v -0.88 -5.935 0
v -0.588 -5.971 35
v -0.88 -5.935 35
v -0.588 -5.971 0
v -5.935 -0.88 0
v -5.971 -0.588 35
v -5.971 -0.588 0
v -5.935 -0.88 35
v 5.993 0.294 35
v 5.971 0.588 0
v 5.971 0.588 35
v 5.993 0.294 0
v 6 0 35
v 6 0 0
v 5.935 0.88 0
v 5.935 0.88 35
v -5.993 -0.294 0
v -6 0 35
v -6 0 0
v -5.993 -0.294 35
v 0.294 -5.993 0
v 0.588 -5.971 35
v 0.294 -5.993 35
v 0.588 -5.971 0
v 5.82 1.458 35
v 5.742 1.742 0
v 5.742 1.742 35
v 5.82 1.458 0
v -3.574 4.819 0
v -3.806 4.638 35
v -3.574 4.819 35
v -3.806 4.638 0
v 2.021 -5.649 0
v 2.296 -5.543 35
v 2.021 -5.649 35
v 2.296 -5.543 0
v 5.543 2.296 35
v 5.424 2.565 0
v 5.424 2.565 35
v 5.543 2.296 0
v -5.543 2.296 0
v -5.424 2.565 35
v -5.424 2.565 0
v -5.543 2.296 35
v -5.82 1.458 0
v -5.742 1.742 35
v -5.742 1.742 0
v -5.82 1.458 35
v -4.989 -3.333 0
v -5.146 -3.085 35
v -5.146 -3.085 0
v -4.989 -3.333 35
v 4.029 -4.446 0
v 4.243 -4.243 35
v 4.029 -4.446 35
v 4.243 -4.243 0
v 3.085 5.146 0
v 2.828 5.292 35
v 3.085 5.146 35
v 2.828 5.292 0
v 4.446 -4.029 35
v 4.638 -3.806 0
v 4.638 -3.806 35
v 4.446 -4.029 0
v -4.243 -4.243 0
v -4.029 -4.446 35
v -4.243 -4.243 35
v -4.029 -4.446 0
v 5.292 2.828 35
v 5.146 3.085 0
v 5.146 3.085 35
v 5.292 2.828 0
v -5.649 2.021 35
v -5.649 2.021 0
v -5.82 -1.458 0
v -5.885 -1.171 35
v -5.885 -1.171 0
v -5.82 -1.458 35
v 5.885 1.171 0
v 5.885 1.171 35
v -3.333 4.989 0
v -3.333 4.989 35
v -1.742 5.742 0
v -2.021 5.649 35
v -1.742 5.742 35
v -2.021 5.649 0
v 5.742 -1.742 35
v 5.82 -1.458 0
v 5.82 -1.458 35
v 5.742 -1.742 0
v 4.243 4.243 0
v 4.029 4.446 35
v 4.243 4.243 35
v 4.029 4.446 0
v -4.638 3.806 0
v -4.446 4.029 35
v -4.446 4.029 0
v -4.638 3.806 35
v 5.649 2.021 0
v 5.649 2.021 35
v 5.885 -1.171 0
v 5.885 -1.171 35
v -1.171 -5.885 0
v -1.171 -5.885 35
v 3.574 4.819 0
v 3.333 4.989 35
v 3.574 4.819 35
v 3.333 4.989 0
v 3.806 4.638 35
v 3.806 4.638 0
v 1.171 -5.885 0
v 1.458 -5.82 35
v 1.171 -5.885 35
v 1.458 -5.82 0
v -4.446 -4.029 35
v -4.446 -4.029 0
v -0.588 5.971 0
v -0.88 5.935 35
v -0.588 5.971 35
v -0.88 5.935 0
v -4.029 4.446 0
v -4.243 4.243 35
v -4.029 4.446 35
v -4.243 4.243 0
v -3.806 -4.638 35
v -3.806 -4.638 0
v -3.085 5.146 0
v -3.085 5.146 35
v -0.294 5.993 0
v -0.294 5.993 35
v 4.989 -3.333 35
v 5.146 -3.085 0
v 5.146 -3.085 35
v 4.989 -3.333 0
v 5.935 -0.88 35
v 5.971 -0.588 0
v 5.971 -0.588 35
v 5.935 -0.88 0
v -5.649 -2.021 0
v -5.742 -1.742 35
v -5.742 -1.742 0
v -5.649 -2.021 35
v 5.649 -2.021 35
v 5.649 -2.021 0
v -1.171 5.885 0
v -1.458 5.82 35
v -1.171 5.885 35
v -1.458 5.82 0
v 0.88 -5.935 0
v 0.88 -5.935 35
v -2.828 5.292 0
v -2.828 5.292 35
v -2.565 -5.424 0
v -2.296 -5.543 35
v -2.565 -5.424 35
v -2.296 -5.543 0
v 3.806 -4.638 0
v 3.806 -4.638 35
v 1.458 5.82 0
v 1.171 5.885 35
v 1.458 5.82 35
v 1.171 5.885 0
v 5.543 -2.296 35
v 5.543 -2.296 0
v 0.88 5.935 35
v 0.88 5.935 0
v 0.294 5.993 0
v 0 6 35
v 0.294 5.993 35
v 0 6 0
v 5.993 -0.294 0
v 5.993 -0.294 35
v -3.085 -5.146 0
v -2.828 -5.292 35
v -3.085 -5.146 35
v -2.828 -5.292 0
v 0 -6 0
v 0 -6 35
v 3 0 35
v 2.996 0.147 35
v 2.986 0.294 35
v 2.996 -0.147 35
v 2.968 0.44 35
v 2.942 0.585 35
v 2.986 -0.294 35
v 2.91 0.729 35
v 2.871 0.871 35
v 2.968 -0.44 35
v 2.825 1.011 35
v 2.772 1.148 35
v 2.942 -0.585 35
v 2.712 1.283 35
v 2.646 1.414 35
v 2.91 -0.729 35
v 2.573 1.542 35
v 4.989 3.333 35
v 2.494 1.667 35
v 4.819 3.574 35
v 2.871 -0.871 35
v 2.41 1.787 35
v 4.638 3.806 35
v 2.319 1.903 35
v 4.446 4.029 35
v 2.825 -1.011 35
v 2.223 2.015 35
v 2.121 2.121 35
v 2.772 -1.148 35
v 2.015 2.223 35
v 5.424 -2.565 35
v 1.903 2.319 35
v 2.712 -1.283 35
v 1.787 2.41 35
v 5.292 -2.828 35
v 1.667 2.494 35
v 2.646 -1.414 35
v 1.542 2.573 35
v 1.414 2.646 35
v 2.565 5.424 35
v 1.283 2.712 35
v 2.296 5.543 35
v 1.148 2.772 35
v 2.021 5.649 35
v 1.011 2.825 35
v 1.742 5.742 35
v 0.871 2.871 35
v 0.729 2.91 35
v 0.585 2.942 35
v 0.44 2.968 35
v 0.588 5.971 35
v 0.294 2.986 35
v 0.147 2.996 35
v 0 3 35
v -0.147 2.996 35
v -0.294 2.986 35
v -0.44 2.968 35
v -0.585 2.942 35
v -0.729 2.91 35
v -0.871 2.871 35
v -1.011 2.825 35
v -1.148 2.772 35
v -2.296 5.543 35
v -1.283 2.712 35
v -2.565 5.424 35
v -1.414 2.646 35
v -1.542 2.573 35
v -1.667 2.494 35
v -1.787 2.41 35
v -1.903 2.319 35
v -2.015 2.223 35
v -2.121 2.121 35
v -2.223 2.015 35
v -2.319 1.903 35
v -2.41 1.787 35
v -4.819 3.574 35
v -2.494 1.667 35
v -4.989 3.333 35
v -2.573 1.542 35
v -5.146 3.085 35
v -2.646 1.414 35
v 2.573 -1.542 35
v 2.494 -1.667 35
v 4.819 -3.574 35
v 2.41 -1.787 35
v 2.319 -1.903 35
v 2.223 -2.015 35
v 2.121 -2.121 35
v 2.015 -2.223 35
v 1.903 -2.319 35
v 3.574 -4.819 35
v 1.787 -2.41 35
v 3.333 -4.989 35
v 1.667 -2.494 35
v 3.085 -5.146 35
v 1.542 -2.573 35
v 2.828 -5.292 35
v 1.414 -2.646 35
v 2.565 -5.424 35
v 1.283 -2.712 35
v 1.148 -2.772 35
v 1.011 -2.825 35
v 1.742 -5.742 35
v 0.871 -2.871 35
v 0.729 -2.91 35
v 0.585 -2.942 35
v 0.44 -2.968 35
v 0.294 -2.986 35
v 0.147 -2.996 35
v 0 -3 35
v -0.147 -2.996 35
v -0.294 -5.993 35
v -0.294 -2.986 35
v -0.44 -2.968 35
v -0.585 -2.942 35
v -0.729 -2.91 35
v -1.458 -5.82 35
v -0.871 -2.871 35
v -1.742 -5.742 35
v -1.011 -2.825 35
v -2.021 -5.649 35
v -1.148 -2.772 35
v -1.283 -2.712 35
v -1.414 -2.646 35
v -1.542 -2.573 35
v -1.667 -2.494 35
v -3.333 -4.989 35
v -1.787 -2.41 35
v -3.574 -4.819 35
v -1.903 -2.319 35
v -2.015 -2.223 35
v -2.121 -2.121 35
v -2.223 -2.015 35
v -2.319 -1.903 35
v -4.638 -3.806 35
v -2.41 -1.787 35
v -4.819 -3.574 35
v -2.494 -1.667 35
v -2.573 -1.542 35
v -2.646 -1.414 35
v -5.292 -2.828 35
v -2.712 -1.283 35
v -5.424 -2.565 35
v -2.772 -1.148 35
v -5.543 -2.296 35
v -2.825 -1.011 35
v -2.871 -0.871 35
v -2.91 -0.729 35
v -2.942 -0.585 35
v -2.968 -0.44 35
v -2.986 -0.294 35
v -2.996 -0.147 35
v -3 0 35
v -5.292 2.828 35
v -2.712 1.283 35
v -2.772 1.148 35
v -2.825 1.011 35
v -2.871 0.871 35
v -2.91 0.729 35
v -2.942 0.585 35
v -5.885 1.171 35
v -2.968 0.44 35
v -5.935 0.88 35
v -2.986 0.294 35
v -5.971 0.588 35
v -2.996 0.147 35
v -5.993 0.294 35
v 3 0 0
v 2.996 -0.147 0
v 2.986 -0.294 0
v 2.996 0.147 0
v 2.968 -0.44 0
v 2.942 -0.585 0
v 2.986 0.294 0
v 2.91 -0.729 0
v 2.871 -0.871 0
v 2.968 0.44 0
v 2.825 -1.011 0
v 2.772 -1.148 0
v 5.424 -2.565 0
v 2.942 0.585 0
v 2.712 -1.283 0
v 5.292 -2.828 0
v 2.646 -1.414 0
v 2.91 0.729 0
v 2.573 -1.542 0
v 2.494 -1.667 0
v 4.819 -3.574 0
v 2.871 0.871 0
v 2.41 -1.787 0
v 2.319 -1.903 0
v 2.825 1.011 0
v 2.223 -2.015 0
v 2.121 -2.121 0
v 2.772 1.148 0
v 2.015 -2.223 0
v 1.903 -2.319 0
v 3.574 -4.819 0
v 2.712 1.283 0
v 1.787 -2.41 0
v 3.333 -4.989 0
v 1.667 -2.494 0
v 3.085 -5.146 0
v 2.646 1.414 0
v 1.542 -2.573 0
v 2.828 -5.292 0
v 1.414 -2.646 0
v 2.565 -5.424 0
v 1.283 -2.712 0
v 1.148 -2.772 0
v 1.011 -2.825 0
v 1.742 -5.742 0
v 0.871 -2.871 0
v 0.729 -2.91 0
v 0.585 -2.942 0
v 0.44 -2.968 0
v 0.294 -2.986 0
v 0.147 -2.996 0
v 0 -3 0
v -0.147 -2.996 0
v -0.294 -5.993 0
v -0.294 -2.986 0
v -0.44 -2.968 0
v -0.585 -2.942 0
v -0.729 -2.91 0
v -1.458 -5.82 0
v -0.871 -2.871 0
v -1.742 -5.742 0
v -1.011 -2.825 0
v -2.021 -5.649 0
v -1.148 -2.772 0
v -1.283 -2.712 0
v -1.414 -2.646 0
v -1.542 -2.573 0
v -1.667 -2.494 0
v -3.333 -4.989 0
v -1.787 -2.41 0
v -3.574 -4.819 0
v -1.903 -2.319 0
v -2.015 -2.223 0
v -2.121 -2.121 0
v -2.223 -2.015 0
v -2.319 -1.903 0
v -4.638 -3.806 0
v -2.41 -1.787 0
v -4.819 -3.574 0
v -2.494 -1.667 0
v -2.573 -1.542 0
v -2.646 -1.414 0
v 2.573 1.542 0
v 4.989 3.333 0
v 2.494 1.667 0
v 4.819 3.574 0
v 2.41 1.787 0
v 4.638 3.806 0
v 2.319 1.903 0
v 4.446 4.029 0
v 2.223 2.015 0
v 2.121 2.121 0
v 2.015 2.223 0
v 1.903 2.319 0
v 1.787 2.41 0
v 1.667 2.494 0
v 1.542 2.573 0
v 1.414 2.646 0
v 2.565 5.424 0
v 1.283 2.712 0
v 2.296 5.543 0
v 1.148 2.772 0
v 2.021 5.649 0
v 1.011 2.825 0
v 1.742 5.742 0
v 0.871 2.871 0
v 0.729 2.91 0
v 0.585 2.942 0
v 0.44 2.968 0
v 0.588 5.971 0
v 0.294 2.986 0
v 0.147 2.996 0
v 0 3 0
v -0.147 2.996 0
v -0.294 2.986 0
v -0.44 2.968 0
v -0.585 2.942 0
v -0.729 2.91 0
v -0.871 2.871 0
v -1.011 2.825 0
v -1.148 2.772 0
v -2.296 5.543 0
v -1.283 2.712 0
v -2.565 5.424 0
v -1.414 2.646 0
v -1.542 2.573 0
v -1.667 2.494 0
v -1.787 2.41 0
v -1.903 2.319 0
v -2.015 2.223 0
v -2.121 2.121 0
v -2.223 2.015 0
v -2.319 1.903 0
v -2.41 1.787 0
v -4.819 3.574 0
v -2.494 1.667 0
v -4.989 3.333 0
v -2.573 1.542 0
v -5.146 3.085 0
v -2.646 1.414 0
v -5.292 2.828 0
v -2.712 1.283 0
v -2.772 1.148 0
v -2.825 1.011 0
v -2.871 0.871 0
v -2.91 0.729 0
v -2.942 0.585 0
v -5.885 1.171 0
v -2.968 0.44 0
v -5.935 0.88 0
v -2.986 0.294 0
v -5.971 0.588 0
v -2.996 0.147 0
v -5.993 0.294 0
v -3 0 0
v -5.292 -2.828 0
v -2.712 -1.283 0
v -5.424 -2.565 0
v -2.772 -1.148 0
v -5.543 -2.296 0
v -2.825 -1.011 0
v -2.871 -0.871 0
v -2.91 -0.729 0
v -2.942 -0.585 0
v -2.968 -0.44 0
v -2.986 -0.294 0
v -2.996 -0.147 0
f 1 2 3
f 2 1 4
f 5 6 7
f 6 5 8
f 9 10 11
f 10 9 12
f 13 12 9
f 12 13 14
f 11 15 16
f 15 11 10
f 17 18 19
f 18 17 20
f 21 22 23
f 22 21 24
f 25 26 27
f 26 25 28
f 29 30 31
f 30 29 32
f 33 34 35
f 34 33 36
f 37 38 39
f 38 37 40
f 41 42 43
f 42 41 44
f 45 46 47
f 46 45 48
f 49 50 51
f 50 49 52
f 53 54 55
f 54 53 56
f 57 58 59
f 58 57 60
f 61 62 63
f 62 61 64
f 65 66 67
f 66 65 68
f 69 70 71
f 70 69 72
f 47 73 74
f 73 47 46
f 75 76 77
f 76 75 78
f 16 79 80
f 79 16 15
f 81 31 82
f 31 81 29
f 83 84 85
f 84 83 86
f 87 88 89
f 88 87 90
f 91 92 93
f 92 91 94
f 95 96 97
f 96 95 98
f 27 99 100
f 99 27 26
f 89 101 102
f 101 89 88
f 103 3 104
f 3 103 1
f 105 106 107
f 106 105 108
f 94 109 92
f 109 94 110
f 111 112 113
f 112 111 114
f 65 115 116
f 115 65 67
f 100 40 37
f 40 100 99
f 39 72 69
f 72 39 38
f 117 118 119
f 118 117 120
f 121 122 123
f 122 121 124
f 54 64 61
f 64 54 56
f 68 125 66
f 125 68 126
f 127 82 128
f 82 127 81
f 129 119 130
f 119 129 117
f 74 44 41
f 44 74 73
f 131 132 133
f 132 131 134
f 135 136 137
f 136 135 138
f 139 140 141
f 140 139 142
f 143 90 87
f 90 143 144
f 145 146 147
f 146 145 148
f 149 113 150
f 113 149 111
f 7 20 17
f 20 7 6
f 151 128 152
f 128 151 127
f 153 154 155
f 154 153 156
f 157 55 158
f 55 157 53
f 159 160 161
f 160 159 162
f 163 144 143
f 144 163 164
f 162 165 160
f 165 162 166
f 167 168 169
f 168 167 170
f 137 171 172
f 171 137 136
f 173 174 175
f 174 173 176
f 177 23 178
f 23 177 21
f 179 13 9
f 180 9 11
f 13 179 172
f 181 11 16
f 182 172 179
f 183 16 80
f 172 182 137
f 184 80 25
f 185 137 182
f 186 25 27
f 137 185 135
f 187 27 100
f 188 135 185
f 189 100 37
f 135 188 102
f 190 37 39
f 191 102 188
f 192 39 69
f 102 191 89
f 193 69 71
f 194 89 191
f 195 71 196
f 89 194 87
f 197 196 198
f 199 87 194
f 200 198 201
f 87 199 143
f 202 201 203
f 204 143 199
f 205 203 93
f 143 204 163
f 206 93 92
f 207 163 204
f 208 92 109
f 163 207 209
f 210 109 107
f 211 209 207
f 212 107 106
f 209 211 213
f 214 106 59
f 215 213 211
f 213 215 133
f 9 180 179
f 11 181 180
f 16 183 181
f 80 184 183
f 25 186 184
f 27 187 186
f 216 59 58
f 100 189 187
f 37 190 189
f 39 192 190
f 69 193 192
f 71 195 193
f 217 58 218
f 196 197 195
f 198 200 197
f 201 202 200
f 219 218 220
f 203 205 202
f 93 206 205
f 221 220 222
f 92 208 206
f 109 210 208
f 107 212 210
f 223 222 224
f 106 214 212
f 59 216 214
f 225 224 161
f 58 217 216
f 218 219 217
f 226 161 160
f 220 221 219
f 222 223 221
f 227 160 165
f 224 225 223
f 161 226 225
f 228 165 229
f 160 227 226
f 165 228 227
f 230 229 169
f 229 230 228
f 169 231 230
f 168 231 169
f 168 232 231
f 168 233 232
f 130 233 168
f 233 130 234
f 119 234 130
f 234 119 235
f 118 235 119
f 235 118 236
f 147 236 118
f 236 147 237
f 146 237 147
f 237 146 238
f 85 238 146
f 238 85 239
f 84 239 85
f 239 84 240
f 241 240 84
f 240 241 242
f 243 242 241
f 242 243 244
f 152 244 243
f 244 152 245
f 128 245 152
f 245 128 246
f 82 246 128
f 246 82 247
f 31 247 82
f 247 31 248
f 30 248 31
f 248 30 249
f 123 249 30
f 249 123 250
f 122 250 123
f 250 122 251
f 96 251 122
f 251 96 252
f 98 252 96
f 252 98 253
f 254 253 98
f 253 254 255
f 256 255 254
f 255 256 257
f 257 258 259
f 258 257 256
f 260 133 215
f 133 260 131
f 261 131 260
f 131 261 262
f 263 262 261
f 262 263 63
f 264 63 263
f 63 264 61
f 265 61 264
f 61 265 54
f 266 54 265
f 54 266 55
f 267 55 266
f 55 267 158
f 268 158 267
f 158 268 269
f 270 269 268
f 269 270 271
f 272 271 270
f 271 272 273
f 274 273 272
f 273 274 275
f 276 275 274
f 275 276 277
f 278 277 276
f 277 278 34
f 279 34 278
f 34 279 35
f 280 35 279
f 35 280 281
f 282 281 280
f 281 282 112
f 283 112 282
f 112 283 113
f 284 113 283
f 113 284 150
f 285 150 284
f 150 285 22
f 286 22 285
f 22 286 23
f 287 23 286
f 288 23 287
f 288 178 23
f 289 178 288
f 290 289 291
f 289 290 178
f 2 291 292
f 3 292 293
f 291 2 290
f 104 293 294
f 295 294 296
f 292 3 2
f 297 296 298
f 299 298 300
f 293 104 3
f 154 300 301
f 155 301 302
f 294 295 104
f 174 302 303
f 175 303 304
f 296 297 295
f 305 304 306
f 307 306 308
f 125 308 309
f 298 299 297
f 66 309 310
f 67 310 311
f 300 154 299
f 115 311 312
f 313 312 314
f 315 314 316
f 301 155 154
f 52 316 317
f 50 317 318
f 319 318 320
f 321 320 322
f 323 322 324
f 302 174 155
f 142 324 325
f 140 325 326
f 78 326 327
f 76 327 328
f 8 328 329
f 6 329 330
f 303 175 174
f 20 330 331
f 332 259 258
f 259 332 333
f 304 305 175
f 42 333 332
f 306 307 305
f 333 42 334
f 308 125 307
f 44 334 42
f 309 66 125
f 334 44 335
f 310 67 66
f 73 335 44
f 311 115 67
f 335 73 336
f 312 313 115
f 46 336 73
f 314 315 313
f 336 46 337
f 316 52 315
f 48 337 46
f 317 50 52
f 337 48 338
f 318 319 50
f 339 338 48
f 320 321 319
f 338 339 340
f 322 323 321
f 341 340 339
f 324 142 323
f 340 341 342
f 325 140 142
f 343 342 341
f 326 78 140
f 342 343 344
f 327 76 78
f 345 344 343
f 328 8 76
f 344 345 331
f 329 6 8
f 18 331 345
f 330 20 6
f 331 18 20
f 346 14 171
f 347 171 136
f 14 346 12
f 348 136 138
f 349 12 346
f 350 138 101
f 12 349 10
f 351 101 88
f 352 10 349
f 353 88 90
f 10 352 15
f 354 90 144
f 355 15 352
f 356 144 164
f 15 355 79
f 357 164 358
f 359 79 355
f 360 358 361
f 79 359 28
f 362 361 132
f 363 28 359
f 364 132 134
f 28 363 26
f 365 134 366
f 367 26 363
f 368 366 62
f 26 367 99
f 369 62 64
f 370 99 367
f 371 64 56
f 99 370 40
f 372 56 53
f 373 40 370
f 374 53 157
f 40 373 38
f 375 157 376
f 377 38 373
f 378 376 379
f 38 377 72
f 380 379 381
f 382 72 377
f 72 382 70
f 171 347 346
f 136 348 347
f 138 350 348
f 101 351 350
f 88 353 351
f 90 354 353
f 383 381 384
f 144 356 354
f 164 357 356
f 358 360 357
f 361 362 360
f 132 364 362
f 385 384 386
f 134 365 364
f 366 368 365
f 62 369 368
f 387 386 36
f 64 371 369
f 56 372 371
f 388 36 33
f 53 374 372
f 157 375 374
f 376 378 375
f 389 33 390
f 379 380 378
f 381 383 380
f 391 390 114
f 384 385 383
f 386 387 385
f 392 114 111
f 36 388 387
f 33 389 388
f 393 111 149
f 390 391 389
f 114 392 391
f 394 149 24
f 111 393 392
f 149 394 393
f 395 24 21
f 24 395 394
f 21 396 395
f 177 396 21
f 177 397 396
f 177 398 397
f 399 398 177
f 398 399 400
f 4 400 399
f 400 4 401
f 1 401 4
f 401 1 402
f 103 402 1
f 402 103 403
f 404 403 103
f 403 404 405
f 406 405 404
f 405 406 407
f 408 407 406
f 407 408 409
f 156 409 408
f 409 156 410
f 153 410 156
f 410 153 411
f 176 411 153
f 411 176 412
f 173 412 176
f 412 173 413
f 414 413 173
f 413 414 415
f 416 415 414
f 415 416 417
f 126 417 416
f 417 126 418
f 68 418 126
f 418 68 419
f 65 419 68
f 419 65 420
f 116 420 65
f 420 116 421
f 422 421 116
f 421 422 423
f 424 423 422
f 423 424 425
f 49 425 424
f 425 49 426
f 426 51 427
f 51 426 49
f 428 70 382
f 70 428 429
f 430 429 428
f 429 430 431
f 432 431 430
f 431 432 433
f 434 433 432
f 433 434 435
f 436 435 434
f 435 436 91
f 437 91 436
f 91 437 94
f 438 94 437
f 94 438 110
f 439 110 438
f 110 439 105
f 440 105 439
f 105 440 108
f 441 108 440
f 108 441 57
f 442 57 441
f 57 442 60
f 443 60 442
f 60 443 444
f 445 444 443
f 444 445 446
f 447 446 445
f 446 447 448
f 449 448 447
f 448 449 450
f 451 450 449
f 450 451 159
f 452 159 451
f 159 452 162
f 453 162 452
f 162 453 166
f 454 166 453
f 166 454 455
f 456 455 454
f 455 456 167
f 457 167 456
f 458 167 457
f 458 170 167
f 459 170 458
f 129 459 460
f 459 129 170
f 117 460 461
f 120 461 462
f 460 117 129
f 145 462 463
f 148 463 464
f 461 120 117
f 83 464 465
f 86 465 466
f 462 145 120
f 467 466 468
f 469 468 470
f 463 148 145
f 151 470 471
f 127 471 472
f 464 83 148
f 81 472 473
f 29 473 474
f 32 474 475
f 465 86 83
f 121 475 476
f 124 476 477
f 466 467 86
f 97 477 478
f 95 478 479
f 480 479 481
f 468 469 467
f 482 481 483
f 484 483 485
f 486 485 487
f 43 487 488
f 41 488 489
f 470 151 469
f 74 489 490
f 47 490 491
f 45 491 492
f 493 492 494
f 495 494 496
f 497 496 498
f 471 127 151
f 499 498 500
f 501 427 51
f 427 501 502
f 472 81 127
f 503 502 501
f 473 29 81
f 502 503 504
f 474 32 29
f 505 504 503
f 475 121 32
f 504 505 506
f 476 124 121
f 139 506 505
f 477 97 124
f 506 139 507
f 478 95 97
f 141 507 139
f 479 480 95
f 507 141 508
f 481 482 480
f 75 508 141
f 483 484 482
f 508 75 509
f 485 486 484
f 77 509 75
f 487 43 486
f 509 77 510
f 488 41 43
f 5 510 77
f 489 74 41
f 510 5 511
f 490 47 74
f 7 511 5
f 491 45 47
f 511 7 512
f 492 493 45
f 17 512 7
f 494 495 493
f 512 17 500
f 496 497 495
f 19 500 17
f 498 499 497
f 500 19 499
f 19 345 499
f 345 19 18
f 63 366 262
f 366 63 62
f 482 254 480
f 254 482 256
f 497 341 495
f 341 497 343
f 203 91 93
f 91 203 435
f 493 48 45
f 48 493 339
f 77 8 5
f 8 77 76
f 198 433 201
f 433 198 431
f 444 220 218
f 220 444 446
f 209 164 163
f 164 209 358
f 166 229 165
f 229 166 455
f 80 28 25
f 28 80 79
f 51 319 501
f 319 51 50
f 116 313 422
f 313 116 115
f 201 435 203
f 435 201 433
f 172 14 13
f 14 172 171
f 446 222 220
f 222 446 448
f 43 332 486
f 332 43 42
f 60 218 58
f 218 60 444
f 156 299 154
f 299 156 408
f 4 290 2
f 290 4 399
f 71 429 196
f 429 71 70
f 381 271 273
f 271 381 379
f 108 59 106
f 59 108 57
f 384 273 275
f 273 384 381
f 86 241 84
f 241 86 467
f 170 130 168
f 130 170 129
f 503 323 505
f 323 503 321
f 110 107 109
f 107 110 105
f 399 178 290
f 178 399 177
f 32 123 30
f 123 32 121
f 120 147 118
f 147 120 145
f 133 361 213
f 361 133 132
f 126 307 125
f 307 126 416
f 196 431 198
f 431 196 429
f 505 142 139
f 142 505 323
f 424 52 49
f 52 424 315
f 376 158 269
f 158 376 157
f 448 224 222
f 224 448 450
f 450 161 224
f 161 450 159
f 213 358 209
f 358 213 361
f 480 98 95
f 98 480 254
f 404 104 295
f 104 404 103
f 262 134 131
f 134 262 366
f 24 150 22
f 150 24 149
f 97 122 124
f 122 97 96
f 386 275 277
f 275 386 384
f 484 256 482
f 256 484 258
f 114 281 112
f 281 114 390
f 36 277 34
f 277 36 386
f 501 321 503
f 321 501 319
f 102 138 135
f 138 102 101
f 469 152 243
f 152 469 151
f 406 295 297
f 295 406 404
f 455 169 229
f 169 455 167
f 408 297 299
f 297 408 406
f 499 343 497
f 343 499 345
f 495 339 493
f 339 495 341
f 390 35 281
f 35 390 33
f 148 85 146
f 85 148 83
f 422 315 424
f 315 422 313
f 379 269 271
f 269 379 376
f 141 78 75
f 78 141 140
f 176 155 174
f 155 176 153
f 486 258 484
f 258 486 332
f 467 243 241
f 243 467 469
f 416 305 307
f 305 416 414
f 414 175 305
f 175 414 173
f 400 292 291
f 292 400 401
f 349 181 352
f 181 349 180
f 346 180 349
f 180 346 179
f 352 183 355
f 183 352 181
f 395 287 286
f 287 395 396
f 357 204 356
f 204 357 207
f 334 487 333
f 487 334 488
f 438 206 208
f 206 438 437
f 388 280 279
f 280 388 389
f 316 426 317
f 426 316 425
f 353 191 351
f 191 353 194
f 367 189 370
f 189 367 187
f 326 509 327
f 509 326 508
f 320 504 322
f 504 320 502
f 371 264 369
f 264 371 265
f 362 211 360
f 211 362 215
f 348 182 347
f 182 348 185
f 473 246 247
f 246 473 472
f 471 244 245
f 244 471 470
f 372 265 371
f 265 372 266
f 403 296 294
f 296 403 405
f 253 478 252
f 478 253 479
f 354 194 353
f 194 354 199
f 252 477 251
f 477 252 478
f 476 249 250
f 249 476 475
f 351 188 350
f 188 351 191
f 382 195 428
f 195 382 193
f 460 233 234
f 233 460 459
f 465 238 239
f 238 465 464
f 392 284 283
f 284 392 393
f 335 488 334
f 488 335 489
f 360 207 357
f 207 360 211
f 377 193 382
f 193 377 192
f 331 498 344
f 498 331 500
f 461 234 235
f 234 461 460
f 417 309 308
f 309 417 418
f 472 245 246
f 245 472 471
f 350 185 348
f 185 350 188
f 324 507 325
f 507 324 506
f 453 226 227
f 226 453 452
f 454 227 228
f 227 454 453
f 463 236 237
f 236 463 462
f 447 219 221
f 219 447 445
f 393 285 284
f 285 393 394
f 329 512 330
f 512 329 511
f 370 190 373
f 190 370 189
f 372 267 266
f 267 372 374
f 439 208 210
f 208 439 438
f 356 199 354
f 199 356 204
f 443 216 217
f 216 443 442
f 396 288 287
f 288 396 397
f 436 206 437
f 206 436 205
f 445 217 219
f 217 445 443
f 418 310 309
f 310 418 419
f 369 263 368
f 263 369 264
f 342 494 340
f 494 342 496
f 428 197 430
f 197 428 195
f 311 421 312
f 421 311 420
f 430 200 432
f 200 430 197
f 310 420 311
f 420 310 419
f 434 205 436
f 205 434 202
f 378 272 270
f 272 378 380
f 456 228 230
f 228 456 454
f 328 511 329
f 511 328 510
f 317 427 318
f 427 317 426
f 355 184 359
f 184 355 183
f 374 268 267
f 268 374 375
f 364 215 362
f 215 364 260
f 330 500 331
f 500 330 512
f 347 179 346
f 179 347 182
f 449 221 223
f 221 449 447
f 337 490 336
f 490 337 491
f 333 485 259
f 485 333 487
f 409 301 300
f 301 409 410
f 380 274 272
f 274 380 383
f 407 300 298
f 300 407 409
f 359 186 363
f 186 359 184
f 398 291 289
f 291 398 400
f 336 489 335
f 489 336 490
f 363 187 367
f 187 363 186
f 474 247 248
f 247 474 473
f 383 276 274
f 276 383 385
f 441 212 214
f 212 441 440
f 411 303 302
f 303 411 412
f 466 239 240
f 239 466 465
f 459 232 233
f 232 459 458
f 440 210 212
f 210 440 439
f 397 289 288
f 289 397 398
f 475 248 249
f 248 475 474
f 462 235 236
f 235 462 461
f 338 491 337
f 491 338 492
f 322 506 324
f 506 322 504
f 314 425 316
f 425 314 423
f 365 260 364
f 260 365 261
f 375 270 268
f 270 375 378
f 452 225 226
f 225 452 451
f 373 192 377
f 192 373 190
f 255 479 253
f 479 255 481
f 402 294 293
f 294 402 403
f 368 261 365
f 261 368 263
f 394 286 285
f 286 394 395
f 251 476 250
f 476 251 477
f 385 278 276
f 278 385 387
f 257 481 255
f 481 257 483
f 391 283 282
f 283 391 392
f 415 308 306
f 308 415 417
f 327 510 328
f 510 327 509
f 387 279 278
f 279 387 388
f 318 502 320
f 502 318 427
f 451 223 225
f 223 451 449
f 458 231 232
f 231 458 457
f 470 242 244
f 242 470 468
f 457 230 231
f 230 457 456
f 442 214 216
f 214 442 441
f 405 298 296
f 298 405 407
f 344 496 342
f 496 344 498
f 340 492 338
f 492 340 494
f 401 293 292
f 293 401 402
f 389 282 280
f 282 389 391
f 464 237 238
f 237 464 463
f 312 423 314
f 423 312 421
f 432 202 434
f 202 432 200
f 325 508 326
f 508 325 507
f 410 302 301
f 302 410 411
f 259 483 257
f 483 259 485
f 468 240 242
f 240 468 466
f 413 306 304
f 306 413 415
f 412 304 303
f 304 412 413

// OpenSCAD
$fn = 128;

bore_d = 6.0;
outer_d = 12.0;
length = 35.0;

difference() {
    cylinder(d = outer_d, h = length, center = false);
    translate([0, 0, -0.1])
        cylinder(d = bore_d, h = length + 0.2, center = false);
}
